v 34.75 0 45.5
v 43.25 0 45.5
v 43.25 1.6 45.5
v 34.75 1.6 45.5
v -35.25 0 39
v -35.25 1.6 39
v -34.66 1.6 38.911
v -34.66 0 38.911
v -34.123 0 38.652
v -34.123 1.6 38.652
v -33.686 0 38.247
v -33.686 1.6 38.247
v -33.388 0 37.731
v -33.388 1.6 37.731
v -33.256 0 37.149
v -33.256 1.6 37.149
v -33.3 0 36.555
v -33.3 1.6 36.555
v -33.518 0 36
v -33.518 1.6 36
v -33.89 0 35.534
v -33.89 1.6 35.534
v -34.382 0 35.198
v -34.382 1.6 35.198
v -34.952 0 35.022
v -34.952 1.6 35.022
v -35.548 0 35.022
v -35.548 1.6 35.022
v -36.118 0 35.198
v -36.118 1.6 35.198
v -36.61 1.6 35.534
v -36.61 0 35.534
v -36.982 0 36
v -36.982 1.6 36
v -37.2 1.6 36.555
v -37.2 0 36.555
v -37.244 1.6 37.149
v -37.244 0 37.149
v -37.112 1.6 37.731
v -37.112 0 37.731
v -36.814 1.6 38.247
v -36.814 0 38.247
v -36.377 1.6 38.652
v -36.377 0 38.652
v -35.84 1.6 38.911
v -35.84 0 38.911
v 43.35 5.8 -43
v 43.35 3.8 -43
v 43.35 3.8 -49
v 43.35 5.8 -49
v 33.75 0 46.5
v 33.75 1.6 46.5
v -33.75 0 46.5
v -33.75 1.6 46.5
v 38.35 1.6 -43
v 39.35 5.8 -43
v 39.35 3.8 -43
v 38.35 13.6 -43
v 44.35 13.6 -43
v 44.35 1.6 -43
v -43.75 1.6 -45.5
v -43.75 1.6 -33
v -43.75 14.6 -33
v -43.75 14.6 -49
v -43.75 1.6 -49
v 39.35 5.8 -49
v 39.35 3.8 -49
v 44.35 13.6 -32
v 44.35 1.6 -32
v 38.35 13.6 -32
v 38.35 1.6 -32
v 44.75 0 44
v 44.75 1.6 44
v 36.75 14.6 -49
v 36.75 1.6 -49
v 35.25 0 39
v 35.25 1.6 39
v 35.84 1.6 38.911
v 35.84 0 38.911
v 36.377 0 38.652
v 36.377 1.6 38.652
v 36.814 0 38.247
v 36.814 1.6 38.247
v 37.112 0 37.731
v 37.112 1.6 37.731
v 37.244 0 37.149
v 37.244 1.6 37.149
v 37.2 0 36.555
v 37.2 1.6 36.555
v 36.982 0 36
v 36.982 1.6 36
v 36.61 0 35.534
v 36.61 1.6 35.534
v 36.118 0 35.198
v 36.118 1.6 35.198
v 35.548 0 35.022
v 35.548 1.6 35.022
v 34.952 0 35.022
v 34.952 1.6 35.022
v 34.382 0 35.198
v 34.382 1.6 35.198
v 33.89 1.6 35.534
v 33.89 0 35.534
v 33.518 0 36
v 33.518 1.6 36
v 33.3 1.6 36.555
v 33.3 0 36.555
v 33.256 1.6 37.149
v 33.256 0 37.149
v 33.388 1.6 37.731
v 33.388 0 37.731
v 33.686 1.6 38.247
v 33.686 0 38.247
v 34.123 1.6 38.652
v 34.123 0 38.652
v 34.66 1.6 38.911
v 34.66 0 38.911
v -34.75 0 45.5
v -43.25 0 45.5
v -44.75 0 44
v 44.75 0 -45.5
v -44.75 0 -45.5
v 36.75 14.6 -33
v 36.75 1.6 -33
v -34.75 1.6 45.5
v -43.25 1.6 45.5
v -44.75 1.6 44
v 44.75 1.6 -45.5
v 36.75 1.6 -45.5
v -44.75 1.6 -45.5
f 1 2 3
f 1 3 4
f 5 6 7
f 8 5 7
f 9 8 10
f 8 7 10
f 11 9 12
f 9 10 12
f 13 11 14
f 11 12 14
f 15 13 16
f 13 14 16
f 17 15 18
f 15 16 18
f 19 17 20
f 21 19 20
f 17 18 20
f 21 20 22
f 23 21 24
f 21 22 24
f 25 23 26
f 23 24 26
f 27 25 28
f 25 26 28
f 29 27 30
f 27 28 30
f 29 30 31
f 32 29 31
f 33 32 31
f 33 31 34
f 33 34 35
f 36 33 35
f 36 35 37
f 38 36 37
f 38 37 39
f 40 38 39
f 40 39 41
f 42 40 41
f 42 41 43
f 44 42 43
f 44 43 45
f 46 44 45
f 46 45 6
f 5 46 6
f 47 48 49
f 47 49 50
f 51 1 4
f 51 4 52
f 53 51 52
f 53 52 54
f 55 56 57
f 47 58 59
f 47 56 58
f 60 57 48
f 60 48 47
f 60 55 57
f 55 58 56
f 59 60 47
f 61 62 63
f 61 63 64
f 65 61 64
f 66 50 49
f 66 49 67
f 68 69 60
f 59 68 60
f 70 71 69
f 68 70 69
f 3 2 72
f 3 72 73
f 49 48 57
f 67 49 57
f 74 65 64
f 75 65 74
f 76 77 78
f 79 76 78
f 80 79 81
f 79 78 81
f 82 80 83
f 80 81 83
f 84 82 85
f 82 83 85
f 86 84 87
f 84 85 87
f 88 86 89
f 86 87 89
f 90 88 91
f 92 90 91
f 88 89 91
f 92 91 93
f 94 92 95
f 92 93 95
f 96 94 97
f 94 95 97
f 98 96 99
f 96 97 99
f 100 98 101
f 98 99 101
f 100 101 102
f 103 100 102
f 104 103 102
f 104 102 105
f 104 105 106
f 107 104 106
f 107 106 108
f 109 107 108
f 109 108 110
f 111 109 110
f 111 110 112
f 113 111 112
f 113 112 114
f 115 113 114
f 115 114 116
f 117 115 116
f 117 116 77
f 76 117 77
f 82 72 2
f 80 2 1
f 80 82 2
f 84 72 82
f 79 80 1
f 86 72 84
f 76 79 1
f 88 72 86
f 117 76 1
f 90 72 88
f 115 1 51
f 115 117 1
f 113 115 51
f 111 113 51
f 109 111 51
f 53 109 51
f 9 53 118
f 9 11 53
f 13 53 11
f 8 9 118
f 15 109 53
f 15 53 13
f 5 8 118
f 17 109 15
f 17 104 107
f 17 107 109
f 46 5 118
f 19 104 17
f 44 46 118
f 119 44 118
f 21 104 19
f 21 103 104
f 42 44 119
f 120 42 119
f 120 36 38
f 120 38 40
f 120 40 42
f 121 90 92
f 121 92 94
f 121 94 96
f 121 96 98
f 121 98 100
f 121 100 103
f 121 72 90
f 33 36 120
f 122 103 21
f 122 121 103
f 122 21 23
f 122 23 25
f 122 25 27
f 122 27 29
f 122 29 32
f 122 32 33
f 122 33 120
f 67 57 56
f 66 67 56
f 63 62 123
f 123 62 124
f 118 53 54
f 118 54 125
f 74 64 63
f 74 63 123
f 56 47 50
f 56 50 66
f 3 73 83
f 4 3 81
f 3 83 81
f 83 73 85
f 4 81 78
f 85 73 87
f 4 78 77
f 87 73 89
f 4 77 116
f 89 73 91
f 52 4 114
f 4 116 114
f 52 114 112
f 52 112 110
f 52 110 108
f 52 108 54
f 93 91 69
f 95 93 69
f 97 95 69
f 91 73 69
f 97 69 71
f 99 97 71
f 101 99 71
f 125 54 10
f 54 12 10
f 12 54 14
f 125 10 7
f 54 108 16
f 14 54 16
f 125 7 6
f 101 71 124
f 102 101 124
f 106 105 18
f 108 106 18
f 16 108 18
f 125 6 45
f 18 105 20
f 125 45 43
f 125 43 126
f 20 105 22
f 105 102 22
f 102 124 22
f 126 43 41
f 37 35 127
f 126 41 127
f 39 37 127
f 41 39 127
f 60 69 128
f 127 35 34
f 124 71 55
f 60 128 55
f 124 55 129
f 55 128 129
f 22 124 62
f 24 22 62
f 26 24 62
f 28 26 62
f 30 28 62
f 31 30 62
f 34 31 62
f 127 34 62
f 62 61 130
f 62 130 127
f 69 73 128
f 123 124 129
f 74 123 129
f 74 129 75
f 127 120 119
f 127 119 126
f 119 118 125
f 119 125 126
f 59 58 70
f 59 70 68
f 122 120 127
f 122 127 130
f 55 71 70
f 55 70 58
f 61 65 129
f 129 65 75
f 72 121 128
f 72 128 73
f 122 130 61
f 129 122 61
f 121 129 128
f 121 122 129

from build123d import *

# Parameters (mm, degrees)
BOSS_EXTRUDE1_DEPTH = 1.6
SKETCH2_W           = 80.5
SKETCH2_H           = 16
BOSS_EXTRUDE2_DEPTH = 13
CUT_EXTRUDE1_REACH  = 69.621
SKETCH3_R           = 2
CHAMFER1_SIZE       = 1.5
SKETCH4_W           = 6
SKETCH4_H           = 11
BOSS_EXTRUDE3_DEPTH = 12
SKETCH5_W           = 4
SKETCH5_H           = 2
BOSS_EXTRUDE4_DEPTH = 6


with BuildPart() as part:
    # Sketch1 → Boss-Extrude1 (new body)
    with BuildSketch(Plane(origin=(0, 0, 0), x_dir=(1, 0, 0), z_dir=(0, 1, 0))):
        Polygon((-44.75, 45.5), (44.75, 45.5), (44.75, -45.5), (34.75, -45.5), (33.75, -46.5), (-33.75, -46.5), (-34.75, -45.5), (-44.75, -45.5), align=None)
    extrude(amount=BOSS_EXTRUDE1_DEPTH)

    # Sketch2 → Boss-Extrude2 (add)
    with BuildSketch(Plane(origin=(0, 1.6, 0), x_dir=(1, 0, 0), z_dir=(0, 1, 0))):
        with Locations((-3.5, 41)):
            Rectangle(SKETCH2_W, SKETCH2_H)
    extrude(amount=BOSS_EXTRUDE2_DEPTH)

    # Sketch3 → Cut-Extrude1 (cut, up to next)
    with BuildSketch(Plane(origin=(0, 1.6, 0), x_dir=(1, 0, 0), z_dir=(0, 1, 0)), mode=Mode.PRIVATE) as cut_extrude1_sk1:
        with Locations(Location((-35.25, -37, 0), (0, 0, 270))):
            Circle(SKETCH3_R)
    cut_extrude1_tool1 = extrude(cut_extrude1_sk1.sketch, amount=-CUT_EXTRUDE1_REACH, mode=Mode.PRIVATE) & part.part
    # Sketch3 → Cut-Extrude1 (cut, up to next)
    with BuildSketch(Plane(origin=(0, 1.6, 0), x_dir=(1, 0, 0), z_dir=(0, 1, 0)), mode=Mode.PRIVATE) as cut_extrude1_sk2:
        with Locations(Location((35.25, -37, 0), (0, 0, 270))):
            Circle(SKETCH3_R)
    cut_extrude1_tool2 = extrude(cut_extrude1_sk2.sketch, amount=-CUT_EXTRUDE1_REACH, mode=Mode.PRIVATE) & part.part
    add(cut_extrude1_tool1.solids().sort_by_distance((-35.25, 1.6, 37))[0], mode=Mode.SUBTRACT)
    add(cut_extrude1_tool2.solids().sort_by_distance((35.25, 1.6, 37))[0], mode=Mode.SUBTRACT)

    # Chamfer1
    chamfer1_edges = [part.edges().sort_by_distance(p)[0] for p in [
        (44.75, 0.8, 45.5),
        (-44.75, 0.8, 45.5),
    ]]
    chamfer(chamfer1_edges, length=CHAMFER1_SIZE)

    # Sketch4 → Boss-Extrude3 (add)
    with BuildSketch(Plane(origin=(0, 1.6, 0), x_dir=(1, 0, 0), z_dir=(0, 1, 0))):
        with Locations((41.35, 37.5)):
            Rectangle(SKETCH4_W, SKETCH4_H)
    extrude(amount=BOSS_EXTRUDE3_DEPTH)

    # Sketch5 → Boss-Extrude4 (add)
    with BuildSketch(Plane(origin=(0, 0, -43), x_dir=(-1, 0, 0), z_dir=(0, 0, -1))):
        with Locations((-41.35, 4.8)):
            Rectangle(SKETCH5_W, SKETCH5_H)
    extrude(amount=BOSS_EXTRUDE4_DEPTH)


solid = part.part
